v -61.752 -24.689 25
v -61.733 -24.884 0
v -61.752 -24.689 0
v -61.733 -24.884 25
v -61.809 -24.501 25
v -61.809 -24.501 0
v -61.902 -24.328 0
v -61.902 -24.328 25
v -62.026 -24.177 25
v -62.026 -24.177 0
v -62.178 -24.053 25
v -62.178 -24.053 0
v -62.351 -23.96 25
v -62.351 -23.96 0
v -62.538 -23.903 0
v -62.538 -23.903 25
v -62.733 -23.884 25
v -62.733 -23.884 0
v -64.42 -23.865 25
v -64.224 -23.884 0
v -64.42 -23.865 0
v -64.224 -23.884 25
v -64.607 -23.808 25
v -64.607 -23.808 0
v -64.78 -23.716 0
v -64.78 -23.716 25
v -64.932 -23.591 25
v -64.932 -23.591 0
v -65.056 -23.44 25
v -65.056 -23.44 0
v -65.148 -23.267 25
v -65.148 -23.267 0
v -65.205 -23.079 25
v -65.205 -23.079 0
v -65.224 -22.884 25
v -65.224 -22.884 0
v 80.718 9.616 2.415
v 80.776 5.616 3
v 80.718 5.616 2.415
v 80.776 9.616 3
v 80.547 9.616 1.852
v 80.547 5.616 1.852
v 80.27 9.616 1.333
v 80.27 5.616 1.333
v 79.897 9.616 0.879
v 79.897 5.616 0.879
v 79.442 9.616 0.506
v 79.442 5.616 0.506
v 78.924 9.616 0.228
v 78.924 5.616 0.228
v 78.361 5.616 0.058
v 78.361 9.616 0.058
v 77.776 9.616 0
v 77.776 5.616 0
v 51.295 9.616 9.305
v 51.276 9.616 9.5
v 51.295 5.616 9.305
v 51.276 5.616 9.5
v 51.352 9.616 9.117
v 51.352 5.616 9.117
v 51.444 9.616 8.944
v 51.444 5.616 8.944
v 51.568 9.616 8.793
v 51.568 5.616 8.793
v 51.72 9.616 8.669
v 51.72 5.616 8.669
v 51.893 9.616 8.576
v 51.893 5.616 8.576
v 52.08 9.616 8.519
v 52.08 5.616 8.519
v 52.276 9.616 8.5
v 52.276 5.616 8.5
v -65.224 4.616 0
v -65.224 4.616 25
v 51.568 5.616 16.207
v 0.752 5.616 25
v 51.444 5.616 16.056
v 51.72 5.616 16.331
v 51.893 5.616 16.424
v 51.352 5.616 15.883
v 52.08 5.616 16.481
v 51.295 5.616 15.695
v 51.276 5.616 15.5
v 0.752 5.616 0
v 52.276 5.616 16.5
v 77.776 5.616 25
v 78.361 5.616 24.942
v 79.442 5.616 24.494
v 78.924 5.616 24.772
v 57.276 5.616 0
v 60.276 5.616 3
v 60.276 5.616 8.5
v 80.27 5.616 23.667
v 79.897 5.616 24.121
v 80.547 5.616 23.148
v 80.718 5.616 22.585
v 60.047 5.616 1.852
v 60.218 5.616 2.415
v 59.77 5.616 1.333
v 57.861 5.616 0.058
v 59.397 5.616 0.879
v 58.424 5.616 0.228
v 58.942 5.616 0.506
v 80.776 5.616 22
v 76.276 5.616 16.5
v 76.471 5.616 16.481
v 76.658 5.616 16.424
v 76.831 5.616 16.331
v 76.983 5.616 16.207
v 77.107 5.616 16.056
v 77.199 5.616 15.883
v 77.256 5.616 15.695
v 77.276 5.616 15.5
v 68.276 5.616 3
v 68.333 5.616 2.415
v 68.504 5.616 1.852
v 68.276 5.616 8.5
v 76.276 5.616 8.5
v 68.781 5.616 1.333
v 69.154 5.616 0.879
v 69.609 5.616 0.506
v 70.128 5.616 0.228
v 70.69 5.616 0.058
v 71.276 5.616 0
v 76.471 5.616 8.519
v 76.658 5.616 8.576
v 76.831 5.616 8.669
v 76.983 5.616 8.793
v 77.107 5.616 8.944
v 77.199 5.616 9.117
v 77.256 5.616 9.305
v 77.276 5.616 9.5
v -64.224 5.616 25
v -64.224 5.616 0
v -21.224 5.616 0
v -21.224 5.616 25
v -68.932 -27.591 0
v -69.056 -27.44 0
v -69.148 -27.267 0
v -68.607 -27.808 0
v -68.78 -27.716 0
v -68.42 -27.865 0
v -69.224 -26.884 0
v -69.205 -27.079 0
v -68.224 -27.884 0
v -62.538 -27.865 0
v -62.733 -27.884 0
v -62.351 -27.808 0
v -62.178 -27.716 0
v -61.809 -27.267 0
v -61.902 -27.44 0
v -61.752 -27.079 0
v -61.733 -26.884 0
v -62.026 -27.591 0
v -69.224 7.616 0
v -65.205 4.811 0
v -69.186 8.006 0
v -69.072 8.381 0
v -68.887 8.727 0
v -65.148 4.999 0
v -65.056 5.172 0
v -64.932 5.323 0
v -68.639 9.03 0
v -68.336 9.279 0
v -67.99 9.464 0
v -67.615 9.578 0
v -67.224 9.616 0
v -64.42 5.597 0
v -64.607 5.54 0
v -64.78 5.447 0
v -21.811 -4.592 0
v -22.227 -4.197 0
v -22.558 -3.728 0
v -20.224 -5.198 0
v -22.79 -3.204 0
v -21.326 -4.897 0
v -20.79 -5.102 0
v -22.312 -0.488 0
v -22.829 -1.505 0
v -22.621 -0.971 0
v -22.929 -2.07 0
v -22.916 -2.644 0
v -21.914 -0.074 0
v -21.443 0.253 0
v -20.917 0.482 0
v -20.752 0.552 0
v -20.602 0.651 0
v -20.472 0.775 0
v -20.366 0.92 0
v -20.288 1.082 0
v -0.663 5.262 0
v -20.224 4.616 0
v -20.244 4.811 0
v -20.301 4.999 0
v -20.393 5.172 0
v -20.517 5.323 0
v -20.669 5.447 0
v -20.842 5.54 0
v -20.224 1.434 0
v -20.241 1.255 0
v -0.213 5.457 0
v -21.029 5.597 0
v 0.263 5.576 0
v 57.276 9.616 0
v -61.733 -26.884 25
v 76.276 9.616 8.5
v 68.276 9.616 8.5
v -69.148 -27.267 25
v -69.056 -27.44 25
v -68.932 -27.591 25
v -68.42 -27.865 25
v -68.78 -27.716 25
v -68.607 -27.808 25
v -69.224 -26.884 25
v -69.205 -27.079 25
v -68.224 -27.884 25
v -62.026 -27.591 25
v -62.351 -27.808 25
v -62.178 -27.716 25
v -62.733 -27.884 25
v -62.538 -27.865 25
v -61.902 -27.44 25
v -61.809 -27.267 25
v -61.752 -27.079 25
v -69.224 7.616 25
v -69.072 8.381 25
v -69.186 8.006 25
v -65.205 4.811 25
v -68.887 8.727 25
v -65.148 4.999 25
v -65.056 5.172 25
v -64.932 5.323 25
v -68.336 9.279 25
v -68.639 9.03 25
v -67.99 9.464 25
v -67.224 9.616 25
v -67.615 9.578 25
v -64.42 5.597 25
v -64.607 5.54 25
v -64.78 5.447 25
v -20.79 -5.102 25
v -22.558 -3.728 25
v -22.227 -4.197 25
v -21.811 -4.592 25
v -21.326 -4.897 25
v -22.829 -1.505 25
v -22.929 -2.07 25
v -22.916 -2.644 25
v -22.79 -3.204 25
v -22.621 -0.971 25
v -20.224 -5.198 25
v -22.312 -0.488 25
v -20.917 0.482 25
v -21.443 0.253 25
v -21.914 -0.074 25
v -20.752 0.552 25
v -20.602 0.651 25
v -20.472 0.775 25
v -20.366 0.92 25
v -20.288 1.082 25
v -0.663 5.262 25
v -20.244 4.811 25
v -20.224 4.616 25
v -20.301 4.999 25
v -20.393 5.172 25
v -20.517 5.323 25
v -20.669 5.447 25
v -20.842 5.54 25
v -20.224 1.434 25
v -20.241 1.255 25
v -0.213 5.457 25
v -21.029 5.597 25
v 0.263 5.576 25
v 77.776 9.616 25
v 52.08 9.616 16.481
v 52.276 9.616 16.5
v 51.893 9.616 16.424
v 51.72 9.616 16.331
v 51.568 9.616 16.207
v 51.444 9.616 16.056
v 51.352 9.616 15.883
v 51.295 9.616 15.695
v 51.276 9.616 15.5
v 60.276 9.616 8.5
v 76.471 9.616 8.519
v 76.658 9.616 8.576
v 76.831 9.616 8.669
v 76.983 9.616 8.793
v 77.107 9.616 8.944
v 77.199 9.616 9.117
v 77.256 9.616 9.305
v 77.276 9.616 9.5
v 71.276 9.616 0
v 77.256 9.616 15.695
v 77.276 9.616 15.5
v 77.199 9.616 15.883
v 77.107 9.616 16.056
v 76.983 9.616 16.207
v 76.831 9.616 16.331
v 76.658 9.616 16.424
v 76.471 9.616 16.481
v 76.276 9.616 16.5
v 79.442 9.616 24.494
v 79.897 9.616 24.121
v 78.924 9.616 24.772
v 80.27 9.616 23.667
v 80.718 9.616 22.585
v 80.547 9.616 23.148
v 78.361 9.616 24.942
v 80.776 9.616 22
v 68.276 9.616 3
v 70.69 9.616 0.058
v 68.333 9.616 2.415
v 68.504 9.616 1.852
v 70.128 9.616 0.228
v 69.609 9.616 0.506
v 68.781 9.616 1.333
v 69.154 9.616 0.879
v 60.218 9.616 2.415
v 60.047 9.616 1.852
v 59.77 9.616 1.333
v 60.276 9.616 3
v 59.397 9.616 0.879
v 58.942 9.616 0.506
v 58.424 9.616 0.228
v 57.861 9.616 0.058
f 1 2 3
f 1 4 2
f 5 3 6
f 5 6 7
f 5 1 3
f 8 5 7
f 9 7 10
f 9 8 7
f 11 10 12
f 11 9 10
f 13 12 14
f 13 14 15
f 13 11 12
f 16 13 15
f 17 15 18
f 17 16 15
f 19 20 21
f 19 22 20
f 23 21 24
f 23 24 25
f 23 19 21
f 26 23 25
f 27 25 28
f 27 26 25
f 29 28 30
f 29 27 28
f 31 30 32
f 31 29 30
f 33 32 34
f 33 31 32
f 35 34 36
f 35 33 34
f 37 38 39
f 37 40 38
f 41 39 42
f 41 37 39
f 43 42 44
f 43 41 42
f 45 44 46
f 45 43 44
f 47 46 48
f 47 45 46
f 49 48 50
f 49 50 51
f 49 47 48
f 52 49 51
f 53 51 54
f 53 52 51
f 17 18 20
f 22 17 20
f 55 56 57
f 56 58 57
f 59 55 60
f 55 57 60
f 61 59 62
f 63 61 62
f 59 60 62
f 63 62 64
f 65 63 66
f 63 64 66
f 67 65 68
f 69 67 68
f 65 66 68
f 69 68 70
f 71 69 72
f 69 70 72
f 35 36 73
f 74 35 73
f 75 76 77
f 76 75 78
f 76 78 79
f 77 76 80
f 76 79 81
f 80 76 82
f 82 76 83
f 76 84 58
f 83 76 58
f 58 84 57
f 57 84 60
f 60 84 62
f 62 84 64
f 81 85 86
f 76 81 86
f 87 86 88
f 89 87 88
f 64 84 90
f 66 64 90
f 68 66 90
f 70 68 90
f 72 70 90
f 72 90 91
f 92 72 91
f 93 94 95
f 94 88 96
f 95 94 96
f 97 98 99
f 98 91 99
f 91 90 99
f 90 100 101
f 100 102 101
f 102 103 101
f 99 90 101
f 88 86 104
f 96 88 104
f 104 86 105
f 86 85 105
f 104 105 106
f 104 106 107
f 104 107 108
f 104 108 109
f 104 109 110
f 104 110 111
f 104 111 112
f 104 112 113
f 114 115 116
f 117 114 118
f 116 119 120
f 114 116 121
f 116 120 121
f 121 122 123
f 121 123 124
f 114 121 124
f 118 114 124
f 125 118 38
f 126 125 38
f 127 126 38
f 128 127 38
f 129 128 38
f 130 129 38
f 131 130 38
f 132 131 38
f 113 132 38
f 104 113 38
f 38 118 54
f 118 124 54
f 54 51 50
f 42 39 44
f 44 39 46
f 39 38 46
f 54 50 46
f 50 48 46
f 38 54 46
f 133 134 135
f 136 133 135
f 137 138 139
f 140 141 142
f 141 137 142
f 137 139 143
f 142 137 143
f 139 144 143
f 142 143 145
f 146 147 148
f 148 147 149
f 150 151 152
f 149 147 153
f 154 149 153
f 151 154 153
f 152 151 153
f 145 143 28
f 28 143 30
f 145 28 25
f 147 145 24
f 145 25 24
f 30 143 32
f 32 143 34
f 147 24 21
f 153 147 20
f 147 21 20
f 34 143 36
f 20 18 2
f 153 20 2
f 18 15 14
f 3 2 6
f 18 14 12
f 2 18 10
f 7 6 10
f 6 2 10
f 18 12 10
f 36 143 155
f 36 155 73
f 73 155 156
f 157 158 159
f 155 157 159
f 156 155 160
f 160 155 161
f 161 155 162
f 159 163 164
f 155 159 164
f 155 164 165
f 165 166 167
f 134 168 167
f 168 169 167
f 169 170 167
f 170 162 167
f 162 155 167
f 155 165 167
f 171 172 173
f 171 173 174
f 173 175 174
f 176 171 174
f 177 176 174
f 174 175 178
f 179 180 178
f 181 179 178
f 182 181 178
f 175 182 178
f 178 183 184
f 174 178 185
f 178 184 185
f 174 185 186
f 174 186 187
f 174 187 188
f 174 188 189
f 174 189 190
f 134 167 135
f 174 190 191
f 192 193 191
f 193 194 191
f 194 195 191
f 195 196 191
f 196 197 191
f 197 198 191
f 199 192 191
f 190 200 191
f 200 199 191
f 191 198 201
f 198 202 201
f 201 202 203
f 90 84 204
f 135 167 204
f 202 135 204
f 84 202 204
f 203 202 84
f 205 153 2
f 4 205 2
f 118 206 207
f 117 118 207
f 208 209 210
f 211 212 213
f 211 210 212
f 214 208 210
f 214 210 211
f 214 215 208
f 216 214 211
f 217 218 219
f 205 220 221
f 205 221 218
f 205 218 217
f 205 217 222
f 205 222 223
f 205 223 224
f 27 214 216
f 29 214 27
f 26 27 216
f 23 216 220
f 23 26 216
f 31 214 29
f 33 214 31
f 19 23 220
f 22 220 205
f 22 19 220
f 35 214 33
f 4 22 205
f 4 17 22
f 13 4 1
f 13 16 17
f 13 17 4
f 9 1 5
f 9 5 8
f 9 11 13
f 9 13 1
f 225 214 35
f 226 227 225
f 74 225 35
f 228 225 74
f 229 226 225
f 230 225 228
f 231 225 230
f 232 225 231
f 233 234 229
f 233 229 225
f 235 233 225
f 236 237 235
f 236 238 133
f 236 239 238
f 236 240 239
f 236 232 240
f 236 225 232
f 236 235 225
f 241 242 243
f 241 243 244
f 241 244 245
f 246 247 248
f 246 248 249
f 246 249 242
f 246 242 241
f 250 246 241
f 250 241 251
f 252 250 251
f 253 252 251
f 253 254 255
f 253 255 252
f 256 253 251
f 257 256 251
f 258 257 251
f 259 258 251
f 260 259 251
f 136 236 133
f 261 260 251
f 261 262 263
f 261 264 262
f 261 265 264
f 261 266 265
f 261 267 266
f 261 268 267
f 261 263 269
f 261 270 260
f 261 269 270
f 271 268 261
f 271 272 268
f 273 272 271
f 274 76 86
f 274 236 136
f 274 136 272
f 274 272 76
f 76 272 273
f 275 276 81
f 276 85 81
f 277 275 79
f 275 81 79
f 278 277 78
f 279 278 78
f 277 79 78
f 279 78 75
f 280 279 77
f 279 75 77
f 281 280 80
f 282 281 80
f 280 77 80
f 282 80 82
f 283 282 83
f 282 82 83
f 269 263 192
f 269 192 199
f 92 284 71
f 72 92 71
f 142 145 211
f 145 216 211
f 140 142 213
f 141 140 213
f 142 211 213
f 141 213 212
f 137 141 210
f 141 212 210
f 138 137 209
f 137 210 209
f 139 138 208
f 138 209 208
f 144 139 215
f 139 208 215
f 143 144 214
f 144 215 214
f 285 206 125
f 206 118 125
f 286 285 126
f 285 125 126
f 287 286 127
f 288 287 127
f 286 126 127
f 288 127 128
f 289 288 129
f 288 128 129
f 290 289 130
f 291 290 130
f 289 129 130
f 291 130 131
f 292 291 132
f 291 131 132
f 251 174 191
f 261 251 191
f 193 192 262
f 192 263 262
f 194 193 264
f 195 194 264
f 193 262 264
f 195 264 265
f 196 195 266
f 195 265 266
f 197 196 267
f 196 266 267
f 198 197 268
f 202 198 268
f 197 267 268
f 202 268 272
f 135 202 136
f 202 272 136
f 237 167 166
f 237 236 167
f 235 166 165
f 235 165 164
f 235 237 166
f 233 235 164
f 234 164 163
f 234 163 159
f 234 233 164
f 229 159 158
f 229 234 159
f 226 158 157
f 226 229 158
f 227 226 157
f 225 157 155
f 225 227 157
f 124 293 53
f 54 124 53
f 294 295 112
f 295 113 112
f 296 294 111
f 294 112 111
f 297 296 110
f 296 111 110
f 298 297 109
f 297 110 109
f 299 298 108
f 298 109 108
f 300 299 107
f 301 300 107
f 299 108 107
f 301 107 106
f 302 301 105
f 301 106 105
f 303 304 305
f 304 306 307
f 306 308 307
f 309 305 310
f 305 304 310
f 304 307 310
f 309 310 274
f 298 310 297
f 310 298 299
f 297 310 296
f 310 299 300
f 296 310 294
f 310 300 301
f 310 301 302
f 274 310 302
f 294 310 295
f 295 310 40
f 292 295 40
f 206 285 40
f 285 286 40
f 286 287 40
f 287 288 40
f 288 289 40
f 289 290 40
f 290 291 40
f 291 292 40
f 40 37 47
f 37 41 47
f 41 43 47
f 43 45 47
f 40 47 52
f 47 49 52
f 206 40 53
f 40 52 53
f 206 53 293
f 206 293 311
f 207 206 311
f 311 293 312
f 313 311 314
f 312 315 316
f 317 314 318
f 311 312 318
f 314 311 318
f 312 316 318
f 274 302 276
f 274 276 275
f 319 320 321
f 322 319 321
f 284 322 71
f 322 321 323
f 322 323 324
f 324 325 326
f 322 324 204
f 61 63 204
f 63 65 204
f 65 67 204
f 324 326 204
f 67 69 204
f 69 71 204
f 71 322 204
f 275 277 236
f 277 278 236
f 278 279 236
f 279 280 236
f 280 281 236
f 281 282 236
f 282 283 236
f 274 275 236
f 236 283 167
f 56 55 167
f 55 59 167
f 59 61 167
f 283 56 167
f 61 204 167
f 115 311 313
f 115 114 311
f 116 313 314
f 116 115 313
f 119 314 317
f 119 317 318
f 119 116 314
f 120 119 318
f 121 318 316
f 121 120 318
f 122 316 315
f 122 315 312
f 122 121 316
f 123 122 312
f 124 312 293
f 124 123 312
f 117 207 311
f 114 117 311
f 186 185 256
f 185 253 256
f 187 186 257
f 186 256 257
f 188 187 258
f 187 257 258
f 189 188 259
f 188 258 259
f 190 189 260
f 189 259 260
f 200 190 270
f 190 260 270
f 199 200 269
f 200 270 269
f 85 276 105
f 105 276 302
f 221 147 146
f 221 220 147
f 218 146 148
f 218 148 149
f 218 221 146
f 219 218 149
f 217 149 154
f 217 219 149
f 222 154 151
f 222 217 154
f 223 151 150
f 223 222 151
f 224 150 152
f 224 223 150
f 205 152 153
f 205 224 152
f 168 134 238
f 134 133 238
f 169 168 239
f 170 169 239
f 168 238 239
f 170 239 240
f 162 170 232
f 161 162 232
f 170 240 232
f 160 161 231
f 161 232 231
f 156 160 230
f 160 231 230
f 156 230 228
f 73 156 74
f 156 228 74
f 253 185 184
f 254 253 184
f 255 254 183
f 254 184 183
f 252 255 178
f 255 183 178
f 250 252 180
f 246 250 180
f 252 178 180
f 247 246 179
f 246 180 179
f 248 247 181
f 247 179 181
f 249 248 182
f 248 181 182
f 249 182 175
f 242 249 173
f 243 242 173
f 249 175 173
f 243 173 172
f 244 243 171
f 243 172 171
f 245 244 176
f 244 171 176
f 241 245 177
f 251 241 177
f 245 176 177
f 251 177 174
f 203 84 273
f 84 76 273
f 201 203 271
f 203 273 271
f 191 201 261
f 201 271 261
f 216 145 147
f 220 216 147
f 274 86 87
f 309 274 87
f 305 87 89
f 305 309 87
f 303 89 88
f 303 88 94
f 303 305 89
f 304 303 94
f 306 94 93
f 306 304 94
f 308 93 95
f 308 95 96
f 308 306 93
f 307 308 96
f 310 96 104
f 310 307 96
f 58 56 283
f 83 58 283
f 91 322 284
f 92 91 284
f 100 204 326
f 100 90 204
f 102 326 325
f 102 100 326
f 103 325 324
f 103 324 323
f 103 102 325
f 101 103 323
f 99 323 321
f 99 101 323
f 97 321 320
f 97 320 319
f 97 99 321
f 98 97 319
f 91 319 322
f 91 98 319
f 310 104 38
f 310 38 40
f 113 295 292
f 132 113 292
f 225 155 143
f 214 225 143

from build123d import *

# Parameters (mm, degrees)
F1_DEPTH = 25
F3_DEPTH = 37.501
F4_R     = 1
F5_R     = 3
F6_R     = 2


with BuildPart() as f1:
    # F0 (on Top) → F1 (new body)
    with BuildSketch(Plane.XY):
        with BuildLine():
            Line((-69.2244253872, -27.8840622671), (-61.7332391261, -27.8840622671))
            Line((-61.7332391261, -27.8840622671), (-61.7332391261, -23.8840622671))
            Line((-61.7332391261, -23.8840622671), (-65.2244253872, -23.8840622671))
            Line((-65.2244253872, -23.8840622671), (-65.2244253872, 5.6159377329))
            Line((-65.2244253872, 5.6159377329), (-20.2244253872, 5.6159377329))
            Line((-20.2244253872, 5.6159377329), (-20.2244253872, 0.6159377329))
            ThreePointArc((-20.2244253872, 0.6159377329), (-22.9369855286, -2.2909603525), (-20.2244253872, -5.1978584379))
            Line((-20.2244253872, -5.1978584379), (0, 5.6159377329))
            Line((0, 5.6159377329), (80.7755746128, 5.6159377329))
            Line((80.7755746128, 5.6159377329), (80.7755746128, 9.6159377329))
            Line((80.7755746128, 9.6159377329), (-69.2244253872, 9.6159377329))
            Line((-69.2244253872, 9.6159377329), (-69.2244253872, -27.8840622671))
        make_face()
    extrude(amount=F1_DEPTH)

    # F2 (on face) → F3 (cut, through all)
    with BuildSketch(Plane(origin=(0, 9.6159377329, 0), x_dir=(-1, 0, 0), z_dir=(0, 1, 0))):
        Polygon((-68.2755746128, 8.5), (-68.2755746128, 0), (-60.2755746128, 0), (-60.2755746128, 8.5), (-51.2755746128, 8.5), (-51.2755746128, 16.5), (-77.2755746128, 16.5), (-77.2755746128, 8.5), align=None)
    extrude(amount=-F3_DEPTH, mode=Mode.SUBTRACT)

    # F4
    f4_edges = [f1.edges().sort_by_distance(p)[0] for p in [
        (77.275575, 7.615938, 16.5),
        (77.275575, 7.615938, 8.5),
        (51.275575, 7.615938, 16.5),
        (51.275575, 7.615938, 8.5),
        (-65.224425, 5.615938, 12.5),
        (-20.224425, 5.615938, 12.5),
        (-20.224425, 0.615938, 12.5),
        (-65.224425, -23.884062, 12.5),
        (-61.733239, -23.884062, 12.5),
        (-61.733239, -27.884062, 12.5),
        (-69.224425, -27.884062, 12.5),
    ]]
    fillet(f4_edges, radius=F4_R)

    # F5
    f5_edges = [f1.edges().sort_by_distance(p)[0] for p in [
        (80.775575, 7.615938, 0),
        (80.775575, 7.615938, 25),
        (68.275575, 7.615938, 0),
        (60.275575, 7.615938, 0),
        (0, 5.615938, 12.5),
    ]]
    fillet(f5_edges, radius=F5_R)

    # F6
    f6_edges = [f1.edges().sort_by_distance(p)[0] for p in [
        (-69.224425, 9.615938, 12.5),
    ]]
    fillet(f6_edges, radius=F6_R)


solid = f1.part
